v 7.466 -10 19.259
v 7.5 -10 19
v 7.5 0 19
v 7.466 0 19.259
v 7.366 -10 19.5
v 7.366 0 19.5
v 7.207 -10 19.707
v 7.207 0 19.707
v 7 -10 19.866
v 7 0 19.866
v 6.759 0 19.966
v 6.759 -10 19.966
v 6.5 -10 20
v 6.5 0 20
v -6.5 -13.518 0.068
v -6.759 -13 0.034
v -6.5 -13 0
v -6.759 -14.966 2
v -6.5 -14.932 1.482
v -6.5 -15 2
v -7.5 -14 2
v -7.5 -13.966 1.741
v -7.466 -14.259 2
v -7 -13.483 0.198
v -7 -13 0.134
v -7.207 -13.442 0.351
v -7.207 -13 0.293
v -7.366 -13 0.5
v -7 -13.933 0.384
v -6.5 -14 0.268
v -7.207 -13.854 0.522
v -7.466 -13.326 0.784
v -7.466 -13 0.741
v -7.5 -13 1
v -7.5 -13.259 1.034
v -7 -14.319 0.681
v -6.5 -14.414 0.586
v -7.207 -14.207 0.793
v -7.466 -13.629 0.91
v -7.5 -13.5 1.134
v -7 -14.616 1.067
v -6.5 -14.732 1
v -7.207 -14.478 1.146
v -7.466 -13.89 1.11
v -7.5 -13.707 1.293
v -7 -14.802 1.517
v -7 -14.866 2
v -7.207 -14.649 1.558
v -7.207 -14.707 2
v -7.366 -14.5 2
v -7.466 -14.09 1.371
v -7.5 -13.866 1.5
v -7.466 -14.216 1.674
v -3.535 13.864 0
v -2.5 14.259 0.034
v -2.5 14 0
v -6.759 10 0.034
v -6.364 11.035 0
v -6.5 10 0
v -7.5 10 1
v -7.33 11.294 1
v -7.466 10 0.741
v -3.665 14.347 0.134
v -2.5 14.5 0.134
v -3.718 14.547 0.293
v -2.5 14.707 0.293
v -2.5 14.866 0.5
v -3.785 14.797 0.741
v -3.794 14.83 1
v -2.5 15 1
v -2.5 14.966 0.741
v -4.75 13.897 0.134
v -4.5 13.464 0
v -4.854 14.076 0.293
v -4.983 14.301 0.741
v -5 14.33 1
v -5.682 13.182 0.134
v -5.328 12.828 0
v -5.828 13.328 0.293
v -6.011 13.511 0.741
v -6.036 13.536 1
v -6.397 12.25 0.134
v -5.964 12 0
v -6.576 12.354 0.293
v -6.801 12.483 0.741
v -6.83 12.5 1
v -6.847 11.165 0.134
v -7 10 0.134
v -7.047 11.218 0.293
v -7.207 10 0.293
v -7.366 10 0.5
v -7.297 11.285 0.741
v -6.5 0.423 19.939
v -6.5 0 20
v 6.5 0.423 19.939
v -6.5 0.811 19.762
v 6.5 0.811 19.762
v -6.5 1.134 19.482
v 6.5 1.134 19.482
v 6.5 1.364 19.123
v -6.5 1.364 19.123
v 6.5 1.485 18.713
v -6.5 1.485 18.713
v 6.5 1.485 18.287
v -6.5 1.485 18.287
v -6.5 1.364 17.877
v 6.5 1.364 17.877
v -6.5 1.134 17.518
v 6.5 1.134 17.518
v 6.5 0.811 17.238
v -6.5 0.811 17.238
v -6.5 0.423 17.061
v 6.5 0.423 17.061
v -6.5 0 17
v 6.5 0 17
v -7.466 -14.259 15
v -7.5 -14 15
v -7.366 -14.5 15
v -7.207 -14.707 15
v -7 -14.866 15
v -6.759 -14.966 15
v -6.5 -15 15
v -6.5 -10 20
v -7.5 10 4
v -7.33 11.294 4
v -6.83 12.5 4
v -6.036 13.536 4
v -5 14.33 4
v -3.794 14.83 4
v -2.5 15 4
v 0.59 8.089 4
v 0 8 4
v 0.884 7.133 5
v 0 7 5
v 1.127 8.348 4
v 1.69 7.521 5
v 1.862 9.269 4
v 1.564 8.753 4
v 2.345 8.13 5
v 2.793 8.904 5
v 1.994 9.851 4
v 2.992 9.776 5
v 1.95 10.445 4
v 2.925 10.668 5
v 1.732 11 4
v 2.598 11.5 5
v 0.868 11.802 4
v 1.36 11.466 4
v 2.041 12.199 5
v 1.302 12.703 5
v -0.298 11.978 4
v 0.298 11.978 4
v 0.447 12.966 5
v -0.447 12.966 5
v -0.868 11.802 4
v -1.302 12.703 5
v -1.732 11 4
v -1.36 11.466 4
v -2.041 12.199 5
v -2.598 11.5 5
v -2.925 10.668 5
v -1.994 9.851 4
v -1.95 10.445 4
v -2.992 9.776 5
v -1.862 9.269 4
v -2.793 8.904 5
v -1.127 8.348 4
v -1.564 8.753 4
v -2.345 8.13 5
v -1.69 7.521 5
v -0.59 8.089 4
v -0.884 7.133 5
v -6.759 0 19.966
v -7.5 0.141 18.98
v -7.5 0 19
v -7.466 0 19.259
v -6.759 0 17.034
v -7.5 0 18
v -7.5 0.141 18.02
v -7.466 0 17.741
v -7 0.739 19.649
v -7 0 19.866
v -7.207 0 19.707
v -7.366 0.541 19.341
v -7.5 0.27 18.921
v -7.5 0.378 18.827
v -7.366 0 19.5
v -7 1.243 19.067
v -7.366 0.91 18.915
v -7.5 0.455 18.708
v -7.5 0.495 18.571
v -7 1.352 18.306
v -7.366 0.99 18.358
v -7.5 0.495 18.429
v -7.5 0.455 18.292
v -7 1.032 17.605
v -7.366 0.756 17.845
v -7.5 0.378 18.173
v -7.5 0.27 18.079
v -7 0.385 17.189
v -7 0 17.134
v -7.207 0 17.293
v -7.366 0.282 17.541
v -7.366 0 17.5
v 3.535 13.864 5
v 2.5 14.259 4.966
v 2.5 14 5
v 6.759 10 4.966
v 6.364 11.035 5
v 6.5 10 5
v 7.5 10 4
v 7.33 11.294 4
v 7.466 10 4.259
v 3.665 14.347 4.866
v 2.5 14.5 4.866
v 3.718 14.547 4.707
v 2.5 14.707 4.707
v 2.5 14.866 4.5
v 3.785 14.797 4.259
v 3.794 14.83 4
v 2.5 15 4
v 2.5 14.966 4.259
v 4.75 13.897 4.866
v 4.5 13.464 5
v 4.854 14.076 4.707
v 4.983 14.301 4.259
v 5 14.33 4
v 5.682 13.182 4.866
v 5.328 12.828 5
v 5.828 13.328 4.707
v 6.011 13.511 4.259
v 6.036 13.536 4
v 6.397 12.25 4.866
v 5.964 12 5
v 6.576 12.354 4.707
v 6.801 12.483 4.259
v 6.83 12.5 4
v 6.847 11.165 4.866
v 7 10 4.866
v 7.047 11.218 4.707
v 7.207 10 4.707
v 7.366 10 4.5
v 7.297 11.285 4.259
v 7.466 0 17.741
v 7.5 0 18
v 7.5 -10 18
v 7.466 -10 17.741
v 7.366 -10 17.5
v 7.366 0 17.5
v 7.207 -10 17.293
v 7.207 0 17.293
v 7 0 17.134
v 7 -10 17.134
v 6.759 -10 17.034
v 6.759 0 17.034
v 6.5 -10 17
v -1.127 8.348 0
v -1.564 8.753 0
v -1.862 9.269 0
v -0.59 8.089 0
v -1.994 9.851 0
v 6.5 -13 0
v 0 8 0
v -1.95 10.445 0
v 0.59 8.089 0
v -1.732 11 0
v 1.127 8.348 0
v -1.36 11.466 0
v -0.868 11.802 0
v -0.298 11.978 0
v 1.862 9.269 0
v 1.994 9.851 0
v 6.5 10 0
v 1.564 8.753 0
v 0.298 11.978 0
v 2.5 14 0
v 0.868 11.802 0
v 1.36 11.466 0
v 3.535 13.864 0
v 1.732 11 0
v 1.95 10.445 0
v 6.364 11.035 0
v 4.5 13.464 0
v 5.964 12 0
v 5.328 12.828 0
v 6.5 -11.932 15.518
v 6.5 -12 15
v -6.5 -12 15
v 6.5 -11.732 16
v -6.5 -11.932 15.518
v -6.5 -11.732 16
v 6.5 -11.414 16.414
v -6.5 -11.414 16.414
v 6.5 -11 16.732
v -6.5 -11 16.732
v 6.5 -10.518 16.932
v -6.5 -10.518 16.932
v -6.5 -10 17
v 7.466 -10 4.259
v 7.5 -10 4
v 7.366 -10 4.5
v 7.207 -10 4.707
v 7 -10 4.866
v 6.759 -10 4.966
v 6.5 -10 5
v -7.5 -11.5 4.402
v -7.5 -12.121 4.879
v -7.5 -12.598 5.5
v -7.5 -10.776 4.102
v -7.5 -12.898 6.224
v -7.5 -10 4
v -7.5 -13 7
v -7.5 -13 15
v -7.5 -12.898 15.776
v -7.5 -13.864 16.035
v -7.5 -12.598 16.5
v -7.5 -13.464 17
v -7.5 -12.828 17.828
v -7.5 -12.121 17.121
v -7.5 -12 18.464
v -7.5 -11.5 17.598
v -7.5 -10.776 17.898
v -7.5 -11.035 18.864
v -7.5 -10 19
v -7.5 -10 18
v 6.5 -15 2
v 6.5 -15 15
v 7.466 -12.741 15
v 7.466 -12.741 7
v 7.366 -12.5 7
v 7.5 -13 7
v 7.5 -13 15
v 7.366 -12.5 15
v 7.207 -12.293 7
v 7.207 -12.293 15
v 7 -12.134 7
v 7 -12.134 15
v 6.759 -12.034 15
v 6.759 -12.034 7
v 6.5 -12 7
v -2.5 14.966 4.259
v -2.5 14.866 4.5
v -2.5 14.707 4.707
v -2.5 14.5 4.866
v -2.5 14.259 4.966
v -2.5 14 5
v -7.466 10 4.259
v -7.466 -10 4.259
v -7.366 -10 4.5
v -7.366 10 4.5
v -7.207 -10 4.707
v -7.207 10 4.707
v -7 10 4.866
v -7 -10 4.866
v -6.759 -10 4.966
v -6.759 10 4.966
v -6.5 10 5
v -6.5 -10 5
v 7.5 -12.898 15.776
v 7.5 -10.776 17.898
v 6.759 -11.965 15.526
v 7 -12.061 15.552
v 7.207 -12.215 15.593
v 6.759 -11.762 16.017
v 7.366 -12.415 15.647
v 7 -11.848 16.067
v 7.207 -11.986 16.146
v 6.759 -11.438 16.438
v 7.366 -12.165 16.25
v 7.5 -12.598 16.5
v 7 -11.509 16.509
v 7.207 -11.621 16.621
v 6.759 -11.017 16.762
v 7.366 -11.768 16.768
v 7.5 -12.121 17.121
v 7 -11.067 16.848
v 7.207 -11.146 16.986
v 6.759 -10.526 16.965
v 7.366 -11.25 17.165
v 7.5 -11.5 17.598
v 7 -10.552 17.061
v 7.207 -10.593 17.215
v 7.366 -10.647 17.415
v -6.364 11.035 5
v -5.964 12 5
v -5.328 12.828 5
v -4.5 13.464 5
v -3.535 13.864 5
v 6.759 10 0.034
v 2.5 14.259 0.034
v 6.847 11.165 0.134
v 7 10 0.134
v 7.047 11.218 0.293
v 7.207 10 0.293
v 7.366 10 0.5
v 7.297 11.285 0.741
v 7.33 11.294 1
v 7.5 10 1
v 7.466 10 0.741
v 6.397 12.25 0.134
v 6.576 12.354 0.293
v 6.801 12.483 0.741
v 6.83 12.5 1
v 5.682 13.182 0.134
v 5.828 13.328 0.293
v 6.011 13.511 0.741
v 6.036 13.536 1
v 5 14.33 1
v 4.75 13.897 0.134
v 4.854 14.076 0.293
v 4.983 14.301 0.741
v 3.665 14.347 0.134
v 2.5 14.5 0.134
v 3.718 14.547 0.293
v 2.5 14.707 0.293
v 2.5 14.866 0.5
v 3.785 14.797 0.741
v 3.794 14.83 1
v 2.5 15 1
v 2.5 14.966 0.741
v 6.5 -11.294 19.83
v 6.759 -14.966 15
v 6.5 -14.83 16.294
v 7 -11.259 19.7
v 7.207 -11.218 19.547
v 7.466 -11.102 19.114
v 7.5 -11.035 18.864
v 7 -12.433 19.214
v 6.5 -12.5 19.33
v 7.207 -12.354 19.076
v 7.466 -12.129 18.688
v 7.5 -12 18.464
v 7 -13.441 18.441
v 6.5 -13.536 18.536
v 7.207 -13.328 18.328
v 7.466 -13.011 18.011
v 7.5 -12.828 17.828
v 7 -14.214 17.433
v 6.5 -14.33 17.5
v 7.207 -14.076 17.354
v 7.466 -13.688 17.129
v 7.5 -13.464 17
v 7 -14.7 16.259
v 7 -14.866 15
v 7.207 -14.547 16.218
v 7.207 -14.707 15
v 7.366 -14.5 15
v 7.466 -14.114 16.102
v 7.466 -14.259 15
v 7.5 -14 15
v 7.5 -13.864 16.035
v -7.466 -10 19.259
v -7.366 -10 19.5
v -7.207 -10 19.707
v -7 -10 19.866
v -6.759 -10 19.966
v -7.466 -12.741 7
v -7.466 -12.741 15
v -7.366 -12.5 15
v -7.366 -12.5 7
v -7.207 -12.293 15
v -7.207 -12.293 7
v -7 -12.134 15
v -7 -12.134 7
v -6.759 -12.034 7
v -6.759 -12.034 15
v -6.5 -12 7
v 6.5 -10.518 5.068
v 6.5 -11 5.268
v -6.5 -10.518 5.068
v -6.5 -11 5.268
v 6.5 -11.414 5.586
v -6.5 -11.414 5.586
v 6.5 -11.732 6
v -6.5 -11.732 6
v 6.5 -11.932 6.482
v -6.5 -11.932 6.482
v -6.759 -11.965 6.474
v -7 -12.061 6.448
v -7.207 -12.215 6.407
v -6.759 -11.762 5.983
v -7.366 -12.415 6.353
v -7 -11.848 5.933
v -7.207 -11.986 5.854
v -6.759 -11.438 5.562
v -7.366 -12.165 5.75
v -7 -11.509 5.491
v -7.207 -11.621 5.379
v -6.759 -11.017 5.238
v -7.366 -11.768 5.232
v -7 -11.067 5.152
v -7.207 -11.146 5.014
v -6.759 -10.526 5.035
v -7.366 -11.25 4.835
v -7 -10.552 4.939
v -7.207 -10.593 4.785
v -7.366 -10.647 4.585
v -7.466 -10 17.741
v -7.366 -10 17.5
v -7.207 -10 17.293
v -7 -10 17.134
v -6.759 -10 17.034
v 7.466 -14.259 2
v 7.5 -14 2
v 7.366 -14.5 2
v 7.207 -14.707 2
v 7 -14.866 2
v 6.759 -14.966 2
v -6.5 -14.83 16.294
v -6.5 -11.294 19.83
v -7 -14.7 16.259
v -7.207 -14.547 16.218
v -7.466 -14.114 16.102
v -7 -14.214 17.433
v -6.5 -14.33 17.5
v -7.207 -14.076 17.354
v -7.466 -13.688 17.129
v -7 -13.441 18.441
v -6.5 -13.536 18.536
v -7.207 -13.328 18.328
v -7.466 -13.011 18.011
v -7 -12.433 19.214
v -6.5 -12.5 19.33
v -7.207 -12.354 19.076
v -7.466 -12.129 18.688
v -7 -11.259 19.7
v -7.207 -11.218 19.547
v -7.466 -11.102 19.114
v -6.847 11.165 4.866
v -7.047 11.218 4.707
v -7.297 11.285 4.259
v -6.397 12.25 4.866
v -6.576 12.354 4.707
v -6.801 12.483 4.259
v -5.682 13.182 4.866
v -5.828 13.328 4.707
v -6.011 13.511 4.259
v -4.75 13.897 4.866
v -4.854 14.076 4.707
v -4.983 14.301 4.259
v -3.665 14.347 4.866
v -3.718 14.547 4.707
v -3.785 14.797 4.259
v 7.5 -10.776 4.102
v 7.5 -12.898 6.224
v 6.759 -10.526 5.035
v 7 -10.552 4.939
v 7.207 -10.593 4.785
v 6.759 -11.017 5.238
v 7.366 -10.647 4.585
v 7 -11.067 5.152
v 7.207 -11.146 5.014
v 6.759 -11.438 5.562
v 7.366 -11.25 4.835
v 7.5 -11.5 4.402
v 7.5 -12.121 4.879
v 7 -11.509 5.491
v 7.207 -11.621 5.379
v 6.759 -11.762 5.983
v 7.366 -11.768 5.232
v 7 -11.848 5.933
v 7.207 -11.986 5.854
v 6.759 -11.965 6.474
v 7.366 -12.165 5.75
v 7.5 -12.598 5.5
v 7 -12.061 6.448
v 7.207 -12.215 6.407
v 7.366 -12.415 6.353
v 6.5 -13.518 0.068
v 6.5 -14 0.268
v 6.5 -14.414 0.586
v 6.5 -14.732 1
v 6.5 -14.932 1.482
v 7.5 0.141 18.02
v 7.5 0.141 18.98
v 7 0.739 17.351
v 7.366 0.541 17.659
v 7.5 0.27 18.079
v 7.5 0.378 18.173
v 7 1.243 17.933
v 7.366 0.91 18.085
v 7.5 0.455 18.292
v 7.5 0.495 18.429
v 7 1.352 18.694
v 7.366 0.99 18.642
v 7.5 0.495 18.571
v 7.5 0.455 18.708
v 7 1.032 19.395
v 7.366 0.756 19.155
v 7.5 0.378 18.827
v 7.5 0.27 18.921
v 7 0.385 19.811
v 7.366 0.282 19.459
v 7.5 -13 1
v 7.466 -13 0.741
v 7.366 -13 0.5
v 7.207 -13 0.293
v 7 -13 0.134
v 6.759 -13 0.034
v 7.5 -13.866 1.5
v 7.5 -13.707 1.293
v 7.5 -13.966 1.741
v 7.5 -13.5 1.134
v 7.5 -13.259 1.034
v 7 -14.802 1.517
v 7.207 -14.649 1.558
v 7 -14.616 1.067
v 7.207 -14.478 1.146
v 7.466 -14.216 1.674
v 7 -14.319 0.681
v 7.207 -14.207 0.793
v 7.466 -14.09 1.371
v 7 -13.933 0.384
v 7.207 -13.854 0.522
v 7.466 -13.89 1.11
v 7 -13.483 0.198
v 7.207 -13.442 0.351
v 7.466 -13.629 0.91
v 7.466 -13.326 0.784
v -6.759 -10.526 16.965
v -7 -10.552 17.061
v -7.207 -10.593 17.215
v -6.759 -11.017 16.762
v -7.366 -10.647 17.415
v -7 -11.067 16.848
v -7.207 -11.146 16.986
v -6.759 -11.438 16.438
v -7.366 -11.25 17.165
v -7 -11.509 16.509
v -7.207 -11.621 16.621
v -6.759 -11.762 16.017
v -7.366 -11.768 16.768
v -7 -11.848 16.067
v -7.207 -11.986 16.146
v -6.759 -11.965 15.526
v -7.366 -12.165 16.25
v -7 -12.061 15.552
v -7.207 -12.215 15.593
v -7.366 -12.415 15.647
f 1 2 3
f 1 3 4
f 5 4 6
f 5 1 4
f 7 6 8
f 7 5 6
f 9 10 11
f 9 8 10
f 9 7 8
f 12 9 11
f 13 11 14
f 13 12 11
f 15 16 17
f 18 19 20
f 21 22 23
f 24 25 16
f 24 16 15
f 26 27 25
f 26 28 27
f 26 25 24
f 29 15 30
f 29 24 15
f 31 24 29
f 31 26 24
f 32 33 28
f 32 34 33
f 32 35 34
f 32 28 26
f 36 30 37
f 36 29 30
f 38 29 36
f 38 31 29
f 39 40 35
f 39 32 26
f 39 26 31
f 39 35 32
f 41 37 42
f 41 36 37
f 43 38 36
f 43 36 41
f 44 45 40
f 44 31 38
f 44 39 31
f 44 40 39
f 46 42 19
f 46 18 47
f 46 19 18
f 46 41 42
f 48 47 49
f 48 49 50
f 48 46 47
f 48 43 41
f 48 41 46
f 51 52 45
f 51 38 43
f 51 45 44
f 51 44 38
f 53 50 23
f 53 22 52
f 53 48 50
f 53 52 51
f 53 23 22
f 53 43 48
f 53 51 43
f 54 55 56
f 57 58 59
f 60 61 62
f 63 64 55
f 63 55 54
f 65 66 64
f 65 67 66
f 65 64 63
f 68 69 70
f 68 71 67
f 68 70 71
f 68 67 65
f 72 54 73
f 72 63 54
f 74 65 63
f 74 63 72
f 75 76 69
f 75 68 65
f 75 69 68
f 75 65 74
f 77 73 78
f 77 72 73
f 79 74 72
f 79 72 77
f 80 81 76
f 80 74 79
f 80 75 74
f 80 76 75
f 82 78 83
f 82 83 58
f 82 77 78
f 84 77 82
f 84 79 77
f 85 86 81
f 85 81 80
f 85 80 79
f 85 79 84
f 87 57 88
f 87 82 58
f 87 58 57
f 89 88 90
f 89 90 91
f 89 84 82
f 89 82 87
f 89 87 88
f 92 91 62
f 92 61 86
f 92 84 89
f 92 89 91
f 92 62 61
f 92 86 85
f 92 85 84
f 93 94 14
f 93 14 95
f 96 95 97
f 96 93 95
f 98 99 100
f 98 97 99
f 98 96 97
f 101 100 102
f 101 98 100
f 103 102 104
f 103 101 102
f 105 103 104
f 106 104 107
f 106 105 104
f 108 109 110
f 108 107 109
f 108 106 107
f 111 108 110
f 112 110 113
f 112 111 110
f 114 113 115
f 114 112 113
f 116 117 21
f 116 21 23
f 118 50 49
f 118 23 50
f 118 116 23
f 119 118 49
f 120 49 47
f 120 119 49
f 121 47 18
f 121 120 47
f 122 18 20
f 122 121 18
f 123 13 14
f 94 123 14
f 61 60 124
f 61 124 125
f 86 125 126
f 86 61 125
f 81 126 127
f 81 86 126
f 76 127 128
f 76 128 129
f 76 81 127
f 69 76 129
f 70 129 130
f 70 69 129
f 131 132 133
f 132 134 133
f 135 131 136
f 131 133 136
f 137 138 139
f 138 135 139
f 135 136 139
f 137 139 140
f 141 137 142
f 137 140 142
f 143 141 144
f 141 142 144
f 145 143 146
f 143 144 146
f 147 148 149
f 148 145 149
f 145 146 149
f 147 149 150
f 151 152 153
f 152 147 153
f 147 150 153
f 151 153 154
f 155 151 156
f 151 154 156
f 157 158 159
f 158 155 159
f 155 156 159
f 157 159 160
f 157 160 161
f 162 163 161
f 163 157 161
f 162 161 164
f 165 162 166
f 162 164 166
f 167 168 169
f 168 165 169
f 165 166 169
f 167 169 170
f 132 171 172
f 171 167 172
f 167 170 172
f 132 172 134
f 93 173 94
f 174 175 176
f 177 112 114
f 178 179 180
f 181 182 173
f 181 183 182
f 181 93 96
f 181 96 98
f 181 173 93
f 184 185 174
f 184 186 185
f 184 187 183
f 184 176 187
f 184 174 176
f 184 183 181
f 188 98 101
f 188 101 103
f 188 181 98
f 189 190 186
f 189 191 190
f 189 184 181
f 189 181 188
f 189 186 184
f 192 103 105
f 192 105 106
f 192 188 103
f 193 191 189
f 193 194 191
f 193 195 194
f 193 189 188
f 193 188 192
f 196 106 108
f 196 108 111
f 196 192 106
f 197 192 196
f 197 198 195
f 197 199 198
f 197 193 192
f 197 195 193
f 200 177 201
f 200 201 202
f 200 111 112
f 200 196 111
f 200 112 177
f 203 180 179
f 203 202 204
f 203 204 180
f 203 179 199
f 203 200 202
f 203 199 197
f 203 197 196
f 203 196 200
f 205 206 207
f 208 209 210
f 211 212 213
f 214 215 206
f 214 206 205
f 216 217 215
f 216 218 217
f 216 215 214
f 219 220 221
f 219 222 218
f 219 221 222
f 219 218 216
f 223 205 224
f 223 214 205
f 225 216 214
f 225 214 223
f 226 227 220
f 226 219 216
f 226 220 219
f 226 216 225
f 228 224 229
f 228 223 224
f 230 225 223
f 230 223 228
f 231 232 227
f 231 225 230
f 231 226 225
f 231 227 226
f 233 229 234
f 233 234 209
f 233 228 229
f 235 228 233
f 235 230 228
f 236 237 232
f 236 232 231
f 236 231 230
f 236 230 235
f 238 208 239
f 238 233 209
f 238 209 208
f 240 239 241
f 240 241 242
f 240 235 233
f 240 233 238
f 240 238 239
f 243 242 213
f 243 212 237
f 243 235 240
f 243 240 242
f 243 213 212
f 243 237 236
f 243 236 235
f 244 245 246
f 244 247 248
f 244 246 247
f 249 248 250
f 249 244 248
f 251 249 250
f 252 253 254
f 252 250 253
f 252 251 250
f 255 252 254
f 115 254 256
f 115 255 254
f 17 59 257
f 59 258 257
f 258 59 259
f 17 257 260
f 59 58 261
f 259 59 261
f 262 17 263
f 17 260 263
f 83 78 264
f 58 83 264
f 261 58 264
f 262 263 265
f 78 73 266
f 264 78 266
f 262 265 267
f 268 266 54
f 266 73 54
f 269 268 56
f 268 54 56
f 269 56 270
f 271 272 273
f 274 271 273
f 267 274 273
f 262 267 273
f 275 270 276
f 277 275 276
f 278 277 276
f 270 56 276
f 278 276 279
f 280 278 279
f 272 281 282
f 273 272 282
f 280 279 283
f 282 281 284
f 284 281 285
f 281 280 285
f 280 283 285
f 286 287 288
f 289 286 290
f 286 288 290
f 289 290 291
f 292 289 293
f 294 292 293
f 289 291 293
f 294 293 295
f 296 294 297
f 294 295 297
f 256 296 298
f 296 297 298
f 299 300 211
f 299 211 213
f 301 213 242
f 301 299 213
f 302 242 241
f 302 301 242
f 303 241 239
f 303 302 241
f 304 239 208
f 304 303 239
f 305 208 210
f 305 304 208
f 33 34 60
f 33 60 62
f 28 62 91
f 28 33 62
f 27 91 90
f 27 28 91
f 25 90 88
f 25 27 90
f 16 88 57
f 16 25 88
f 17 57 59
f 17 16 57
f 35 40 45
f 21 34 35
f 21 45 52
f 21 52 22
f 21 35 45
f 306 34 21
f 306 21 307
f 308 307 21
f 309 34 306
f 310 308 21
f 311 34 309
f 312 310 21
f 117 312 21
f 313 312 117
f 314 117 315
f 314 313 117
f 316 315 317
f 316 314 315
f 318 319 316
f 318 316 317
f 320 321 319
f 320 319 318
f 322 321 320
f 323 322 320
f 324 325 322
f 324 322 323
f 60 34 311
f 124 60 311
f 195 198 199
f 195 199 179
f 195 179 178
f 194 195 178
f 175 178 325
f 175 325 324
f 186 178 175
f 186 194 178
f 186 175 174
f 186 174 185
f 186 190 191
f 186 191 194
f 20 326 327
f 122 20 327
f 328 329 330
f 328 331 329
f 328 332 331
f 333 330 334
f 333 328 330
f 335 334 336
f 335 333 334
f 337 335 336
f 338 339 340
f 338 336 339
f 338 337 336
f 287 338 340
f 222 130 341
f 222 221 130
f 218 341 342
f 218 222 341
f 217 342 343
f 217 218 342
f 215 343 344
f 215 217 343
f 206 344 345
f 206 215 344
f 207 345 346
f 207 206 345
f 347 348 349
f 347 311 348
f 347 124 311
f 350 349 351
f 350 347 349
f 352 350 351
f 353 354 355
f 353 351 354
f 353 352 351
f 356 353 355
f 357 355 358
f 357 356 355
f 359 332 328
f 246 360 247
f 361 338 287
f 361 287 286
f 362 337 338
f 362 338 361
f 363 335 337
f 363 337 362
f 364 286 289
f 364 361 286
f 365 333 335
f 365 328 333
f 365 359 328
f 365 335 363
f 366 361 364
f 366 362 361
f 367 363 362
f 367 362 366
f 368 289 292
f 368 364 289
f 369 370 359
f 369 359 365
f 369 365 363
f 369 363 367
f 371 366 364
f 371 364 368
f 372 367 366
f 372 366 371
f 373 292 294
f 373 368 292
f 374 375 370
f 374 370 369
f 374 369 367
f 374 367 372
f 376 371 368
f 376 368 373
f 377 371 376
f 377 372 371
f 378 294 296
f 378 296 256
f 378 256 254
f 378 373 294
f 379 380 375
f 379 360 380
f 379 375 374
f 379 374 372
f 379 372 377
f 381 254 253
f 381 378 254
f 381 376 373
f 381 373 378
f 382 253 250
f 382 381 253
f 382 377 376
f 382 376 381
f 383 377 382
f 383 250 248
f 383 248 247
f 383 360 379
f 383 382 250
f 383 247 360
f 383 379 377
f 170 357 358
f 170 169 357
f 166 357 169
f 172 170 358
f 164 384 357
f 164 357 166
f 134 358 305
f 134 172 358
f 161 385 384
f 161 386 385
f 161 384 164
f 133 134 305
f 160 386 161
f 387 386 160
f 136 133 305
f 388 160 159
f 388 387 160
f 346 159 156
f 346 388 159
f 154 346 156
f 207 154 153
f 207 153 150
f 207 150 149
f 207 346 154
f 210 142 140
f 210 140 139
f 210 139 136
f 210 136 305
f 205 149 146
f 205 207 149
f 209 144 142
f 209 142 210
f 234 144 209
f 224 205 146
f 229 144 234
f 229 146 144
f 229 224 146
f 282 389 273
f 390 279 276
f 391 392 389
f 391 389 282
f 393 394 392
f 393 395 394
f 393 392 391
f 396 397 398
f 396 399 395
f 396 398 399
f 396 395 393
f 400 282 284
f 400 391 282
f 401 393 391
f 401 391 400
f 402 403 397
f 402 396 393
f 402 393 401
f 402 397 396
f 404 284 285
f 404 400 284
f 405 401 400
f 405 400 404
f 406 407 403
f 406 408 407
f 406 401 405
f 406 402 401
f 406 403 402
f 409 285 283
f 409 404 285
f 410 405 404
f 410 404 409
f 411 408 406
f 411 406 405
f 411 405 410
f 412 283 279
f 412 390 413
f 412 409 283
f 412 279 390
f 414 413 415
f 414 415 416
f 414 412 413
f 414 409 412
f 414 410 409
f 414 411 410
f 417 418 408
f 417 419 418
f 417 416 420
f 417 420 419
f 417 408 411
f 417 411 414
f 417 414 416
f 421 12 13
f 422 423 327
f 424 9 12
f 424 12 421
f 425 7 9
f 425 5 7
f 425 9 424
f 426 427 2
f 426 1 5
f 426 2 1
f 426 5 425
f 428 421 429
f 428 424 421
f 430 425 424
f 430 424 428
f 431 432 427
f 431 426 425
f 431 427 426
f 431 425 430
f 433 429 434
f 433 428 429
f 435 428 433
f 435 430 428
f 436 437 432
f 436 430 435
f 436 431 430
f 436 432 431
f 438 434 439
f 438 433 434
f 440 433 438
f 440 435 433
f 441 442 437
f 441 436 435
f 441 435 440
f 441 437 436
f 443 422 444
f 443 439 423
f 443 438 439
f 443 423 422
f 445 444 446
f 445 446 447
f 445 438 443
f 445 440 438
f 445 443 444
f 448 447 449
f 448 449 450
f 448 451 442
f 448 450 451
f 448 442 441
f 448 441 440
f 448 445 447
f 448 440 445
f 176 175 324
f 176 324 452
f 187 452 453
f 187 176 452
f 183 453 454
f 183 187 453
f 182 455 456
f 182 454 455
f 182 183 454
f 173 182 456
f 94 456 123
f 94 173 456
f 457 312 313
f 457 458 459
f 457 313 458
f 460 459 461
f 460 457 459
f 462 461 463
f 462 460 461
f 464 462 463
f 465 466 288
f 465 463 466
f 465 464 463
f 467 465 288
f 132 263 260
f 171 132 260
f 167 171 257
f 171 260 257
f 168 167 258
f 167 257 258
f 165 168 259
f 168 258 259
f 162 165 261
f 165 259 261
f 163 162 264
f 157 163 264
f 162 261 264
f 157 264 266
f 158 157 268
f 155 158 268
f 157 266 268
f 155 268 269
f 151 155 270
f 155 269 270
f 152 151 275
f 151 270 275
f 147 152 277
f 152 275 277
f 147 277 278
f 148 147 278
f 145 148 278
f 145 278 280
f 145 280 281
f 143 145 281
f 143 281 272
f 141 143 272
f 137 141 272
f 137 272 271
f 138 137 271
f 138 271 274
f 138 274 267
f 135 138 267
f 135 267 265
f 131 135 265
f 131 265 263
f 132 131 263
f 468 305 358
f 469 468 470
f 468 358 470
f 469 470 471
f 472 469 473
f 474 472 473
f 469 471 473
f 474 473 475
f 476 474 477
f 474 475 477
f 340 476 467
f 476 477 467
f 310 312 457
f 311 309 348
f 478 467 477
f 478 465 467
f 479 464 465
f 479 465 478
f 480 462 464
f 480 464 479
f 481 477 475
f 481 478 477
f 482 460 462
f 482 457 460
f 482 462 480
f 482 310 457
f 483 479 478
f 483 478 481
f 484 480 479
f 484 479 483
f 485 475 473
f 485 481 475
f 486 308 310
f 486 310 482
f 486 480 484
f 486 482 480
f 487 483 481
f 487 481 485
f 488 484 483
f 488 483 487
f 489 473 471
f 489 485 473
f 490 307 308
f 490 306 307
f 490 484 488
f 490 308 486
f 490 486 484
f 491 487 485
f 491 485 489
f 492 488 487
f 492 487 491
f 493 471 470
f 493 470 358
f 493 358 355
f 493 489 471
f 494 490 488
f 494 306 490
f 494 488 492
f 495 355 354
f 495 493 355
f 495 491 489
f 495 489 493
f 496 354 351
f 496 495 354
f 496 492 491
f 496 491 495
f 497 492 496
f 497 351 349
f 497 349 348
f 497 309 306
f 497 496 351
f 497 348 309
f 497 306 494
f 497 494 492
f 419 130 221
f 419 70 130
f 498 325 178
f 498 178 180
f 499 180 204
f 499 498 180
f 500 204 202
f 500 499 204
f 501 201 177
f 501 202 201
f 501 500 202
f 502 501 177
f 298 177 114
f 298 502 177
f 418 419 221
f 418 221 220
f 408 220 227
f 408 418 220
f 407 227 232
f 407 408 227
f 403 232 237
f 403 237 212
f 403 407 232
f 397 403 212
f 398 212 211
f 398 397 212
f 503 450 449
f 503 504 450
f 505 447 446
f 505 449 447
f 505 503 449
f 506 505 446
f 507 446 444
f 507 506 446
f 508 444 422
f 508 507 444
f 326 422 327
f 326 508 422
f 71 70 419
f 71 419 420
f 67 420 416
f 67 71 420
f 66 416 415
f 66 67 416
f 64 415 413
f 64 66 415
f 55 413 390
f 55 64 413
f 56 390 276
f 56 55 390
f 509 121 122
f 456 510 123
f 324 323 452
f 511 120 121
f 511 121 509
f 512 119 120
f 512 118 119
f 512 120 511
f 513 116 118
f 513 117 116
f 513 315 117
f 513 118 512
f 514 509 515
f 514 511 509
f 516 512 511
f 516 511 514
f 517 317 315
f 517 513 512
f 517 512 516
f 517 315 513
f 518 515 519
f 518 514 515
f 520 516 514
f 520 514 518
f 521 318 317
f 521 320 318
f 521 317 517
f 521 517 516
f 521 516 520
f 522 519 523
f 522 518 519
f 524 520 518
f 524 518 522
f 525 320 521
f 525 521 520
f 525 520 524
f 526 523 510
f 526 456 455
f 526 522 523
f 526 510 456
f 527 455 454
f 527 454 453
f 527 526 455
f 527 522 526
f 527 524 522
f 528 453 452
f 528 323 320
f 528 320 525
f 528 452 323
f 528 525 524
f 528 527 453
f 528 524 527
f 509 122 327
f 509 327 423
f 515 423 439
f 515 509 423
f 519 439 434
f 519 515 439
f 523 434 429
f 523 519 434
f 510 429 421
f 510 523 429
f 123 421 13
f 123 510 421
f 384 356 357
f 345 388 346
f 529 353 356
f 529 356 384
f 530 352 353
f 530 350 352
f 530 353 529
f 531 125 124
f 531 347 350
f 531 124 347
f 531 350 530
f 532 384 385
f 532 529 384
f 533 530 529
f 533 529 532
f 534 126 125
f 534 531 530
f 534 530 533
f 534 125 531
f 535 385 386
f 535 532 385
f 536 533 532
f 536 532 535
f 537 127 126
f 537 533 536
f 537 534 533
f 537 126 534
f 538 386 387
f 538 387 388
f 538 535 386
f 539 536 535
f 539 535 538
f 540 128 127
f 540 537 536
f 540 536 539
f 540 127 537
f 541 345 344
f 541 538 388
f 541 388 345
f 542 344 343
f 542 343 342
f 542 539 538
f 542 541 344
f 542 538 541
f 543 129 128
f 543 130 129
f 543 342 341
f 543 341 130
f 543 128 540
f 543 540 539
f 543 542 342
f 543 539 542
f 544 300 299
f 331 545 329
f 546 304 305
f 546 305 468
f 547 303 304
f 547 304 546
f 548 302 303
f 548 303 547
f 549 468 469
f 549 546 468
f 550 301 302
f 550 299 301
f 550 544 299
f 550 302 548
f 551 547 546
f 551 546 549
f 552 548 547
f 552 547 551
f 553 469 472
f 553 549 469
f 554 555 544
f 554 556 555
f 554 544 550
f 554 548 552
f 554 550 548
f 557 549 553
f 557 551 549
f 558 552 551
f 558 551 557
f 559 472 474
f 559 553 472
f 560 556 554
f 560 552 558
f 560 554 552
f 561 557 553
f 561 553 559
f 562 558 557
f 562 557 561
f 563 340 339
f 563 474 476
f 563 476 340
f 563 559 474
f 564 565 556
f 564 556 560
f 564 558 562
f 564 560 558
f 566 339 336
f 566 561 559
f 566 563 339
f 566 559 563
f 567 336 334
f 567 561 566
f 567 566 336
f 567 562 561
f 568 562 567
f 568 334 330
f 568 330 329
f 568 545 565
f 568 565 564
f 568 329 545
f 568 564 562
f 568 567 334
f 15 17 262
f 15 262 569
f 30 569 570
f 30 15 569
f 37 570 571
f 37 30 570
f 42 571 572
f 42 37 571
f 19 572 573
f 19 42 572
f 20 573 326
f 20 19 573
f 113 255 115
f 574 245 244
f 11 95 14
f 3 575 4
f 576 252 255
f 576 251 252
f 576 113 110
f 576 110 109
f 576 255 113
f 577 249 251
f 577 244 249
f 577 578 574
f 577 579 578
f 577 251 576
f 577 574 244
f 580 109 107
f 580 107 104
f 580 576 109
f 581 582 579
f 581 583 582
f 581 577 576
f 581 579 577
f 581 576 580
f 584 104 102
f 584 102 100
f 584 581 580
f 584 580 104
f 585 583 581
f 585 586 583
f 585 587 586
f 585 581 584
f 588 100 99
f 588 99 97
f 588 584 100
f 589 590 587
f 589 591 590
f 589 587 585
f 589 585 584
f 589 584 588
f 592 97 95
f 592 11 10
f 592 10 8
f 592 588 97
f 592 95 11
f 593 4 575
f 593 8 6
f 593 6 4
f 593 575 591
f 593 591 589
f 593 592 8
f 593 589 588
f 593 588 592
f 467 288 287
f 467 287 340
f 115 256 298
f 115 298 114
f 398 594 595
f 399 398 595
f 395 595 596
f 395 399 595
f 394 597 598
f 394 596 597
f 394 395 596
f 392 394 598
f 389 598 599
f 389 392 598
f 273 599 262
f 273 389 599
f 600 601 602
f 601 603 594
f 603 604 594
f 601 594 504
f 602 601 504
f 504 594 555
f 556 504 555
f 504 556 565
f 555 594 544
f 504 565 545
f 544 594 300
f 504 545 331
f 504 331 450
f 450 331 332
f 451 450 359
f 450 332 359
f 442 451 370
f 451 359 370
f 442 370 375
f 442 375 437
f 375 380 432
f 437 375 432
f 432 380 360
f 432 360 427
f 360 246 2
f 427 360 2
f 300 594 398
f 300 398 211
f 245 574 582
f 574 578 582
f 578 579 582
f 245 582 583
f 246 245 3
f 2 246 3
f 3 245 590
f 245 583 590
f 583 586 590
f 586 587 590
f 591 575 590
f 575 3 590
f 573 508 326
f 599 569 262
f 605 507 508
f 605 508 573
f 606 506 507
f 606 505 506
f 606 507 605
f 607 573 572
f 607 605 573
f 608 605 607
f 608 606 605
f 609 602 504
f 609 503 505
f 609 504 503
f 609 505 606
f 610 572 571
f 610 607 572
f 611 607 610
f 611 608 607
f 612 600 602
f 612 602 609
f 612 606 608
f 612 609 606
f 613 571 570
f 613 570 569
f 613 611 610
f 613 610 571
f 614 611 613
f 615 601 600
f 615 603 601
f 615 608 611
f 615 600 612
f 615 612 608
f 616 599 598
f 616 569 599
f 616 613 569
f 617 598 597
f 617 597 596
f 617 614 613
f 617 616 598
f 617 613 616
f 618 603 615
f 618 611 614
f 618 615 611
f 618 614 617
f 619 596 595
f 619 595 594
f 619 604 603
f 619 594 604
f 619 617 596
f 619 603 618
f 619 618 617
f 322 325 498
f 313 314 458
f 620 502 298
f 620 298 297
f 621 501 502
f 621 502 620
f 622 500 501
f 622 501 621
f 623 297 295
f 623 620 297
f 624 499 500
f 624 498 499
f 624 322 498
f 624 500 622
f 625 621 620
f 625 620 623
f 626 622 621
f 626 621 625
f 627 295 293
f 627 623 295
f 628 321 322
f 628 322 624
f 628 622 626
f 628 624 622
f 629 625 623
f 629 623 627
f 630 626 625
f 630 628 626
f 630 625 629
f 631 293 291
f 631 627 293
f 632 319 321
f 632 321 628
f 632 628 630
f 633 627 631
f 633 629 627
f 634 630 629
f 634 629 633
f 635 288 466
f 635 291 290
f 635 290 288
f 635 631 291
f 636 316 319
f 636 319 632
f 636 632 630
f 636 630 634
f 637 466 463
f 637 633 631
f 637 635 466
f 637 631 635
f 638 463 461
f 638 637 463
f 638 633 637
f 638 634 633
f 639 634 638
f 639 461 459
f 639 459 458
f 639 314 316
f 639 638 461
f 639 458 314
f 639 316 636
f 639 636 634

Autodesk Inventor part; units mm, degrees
ref_plane "YZ Plane" through (0, 0, 0) normal (1, 0, 0) x (0, 1, 0)
ref_plane "XZ Plane" through (0, 0, 0) normal (0, 1, 0) x (-1, 0, 0)
ref_plane "XY Plane" through (0, 0, 0) normal (0, 0, 1) x (1, 0, 0)
sketch "Sketch1" plane through (0, 0, 0) normal (0, 0, 1) x (1, 0, 0)
  line L0 (-2.5, 15) -> (2.5, 15)
  line L1 (7.5, 10) -> (7.5, -15)
  line L2 (7.5, -15) -> (-7.5, -15)
  line L3 (-7.5, -15) -> (-7.5, 10)
  line L4 (-7.5, 15) -> (7.5, -15) construction
  line L5 (7.5, 15) -> (-7.5, -15) construction
  arc A0 (-2.5, 15) -> (-7.5, 10) centre (-2.5, 10) ccw
  arc A1 (7.5, 10) -> (2.5, 15) centre (2.5, 10) ccw
  circle A2 centre (0, 10) radius 1.5
  point P0 (0, 0)
  dimension "d0" = 15
  dimension "HOOK_LEN" = 30
  dimension "d2" = 5
  dimension "d3" = 3
  dimension "d13" = 5
extrude "Extrusion1" add sketch "Sketch1" along normal blind 5
sketch "Sketch2" plane through (0, 0, 5) normal (0, 0, 1) x (1, 0, 0)
  circle A0 centre (0, 10) radius 1.5 projected
  point P0 (0, 0)
  point P1 (0, 10)
hole "Hole1" at (0, 10, 5) direction (0, 0, -1) diameter 4 end through all countersink diameter 6 countersink angle 90
sketch "Sketch3" plane through (-7.5, -15, 0) normal (-1, 0, 0) x (0, 0, 1)
  line L0 (5, 0) -> (15, 0)
  arc A0 (15, 0) -> (20, 5) centre (15, 5) ccw
  line L1 (20, 5) -> (20, 15)
  line L2 (20, 15) -> (20, 5)
  arc A1 (15, 3) -> (17, 5) centre (15, 5) ccw
  line L3 (15, 3) -> (7, 3)
  line L4 (17, 5) -> (17, 15)
  arc A2 (20, 15) -> (17, 15) centre (18.5, 15) ccw
  arc A3 (5, 5) -> (7, 3) centre (7, 5) ccw
  line L5 (5, 25) -> (5, 0) projected
  line L6 (5, 5) -> (5, 0)
  point P0 (0, 15)
  dimension "d14" = 10
  dimension "d15" = 10
  dimension "d17" = 3
  dimension "d19" = 4
extrude "Extrusion2" add sketch "Sketch3" against normal up to surface (15 mm away)
sketch "Sketch4" plane through (-7.5, -15, 0) normal (-1, 0, 0) x (0, 0, 1)
  arc A0 (0, 2) -> (2, 0) centre (2, 2) ccw
  line L0 (0, 25) -> (0, 0) projected
  line L1 (0, 0) -> (15, 0) projected
  point P0 (0, 15)
  dimension "d22" = 4
extrude "Extrusion3" cut sketch "Sketch4" against normal through all
fillet "Fillet1" radius 1 28 edges at (7.5, -11.4142, 5.5858) (7.5, 0, 5) (6.0355, 13.5355, 5) (0, 15, 5) (-6.0355, 13.5355, 5) (-7.5, 0, 5) (-7.5, -11.4142, 5.5858) (-7.5, -12, 11) (-7.5, -11.4142, 16.4142) (-7.5, -5, 17) (-7.5, 1.5, 18.5) (-7.5, -5, 20) (-7.5, -13.5355, 18.5355) (-7.5, -15, 8.5) (-7.5, -14.4142, 0.5858) (-7.5, -1.5, 0) (-6.0355, 13.5355, 0) (0, 15, 0) (6.0355, 13.5355, 0) (7.5, -1.5, 0) (7.5, -14.4142, 0.5858) (7.5, -15, 8.5) (7.5, -13.5355, 18.5355) (7.5, -5, 20) (7.5, 1.5, 18.5) (7.5, -5, 17) (7.5, -11.4142, 16.4142) (7.5, -12, 11)
properties part number "hook_straight"
